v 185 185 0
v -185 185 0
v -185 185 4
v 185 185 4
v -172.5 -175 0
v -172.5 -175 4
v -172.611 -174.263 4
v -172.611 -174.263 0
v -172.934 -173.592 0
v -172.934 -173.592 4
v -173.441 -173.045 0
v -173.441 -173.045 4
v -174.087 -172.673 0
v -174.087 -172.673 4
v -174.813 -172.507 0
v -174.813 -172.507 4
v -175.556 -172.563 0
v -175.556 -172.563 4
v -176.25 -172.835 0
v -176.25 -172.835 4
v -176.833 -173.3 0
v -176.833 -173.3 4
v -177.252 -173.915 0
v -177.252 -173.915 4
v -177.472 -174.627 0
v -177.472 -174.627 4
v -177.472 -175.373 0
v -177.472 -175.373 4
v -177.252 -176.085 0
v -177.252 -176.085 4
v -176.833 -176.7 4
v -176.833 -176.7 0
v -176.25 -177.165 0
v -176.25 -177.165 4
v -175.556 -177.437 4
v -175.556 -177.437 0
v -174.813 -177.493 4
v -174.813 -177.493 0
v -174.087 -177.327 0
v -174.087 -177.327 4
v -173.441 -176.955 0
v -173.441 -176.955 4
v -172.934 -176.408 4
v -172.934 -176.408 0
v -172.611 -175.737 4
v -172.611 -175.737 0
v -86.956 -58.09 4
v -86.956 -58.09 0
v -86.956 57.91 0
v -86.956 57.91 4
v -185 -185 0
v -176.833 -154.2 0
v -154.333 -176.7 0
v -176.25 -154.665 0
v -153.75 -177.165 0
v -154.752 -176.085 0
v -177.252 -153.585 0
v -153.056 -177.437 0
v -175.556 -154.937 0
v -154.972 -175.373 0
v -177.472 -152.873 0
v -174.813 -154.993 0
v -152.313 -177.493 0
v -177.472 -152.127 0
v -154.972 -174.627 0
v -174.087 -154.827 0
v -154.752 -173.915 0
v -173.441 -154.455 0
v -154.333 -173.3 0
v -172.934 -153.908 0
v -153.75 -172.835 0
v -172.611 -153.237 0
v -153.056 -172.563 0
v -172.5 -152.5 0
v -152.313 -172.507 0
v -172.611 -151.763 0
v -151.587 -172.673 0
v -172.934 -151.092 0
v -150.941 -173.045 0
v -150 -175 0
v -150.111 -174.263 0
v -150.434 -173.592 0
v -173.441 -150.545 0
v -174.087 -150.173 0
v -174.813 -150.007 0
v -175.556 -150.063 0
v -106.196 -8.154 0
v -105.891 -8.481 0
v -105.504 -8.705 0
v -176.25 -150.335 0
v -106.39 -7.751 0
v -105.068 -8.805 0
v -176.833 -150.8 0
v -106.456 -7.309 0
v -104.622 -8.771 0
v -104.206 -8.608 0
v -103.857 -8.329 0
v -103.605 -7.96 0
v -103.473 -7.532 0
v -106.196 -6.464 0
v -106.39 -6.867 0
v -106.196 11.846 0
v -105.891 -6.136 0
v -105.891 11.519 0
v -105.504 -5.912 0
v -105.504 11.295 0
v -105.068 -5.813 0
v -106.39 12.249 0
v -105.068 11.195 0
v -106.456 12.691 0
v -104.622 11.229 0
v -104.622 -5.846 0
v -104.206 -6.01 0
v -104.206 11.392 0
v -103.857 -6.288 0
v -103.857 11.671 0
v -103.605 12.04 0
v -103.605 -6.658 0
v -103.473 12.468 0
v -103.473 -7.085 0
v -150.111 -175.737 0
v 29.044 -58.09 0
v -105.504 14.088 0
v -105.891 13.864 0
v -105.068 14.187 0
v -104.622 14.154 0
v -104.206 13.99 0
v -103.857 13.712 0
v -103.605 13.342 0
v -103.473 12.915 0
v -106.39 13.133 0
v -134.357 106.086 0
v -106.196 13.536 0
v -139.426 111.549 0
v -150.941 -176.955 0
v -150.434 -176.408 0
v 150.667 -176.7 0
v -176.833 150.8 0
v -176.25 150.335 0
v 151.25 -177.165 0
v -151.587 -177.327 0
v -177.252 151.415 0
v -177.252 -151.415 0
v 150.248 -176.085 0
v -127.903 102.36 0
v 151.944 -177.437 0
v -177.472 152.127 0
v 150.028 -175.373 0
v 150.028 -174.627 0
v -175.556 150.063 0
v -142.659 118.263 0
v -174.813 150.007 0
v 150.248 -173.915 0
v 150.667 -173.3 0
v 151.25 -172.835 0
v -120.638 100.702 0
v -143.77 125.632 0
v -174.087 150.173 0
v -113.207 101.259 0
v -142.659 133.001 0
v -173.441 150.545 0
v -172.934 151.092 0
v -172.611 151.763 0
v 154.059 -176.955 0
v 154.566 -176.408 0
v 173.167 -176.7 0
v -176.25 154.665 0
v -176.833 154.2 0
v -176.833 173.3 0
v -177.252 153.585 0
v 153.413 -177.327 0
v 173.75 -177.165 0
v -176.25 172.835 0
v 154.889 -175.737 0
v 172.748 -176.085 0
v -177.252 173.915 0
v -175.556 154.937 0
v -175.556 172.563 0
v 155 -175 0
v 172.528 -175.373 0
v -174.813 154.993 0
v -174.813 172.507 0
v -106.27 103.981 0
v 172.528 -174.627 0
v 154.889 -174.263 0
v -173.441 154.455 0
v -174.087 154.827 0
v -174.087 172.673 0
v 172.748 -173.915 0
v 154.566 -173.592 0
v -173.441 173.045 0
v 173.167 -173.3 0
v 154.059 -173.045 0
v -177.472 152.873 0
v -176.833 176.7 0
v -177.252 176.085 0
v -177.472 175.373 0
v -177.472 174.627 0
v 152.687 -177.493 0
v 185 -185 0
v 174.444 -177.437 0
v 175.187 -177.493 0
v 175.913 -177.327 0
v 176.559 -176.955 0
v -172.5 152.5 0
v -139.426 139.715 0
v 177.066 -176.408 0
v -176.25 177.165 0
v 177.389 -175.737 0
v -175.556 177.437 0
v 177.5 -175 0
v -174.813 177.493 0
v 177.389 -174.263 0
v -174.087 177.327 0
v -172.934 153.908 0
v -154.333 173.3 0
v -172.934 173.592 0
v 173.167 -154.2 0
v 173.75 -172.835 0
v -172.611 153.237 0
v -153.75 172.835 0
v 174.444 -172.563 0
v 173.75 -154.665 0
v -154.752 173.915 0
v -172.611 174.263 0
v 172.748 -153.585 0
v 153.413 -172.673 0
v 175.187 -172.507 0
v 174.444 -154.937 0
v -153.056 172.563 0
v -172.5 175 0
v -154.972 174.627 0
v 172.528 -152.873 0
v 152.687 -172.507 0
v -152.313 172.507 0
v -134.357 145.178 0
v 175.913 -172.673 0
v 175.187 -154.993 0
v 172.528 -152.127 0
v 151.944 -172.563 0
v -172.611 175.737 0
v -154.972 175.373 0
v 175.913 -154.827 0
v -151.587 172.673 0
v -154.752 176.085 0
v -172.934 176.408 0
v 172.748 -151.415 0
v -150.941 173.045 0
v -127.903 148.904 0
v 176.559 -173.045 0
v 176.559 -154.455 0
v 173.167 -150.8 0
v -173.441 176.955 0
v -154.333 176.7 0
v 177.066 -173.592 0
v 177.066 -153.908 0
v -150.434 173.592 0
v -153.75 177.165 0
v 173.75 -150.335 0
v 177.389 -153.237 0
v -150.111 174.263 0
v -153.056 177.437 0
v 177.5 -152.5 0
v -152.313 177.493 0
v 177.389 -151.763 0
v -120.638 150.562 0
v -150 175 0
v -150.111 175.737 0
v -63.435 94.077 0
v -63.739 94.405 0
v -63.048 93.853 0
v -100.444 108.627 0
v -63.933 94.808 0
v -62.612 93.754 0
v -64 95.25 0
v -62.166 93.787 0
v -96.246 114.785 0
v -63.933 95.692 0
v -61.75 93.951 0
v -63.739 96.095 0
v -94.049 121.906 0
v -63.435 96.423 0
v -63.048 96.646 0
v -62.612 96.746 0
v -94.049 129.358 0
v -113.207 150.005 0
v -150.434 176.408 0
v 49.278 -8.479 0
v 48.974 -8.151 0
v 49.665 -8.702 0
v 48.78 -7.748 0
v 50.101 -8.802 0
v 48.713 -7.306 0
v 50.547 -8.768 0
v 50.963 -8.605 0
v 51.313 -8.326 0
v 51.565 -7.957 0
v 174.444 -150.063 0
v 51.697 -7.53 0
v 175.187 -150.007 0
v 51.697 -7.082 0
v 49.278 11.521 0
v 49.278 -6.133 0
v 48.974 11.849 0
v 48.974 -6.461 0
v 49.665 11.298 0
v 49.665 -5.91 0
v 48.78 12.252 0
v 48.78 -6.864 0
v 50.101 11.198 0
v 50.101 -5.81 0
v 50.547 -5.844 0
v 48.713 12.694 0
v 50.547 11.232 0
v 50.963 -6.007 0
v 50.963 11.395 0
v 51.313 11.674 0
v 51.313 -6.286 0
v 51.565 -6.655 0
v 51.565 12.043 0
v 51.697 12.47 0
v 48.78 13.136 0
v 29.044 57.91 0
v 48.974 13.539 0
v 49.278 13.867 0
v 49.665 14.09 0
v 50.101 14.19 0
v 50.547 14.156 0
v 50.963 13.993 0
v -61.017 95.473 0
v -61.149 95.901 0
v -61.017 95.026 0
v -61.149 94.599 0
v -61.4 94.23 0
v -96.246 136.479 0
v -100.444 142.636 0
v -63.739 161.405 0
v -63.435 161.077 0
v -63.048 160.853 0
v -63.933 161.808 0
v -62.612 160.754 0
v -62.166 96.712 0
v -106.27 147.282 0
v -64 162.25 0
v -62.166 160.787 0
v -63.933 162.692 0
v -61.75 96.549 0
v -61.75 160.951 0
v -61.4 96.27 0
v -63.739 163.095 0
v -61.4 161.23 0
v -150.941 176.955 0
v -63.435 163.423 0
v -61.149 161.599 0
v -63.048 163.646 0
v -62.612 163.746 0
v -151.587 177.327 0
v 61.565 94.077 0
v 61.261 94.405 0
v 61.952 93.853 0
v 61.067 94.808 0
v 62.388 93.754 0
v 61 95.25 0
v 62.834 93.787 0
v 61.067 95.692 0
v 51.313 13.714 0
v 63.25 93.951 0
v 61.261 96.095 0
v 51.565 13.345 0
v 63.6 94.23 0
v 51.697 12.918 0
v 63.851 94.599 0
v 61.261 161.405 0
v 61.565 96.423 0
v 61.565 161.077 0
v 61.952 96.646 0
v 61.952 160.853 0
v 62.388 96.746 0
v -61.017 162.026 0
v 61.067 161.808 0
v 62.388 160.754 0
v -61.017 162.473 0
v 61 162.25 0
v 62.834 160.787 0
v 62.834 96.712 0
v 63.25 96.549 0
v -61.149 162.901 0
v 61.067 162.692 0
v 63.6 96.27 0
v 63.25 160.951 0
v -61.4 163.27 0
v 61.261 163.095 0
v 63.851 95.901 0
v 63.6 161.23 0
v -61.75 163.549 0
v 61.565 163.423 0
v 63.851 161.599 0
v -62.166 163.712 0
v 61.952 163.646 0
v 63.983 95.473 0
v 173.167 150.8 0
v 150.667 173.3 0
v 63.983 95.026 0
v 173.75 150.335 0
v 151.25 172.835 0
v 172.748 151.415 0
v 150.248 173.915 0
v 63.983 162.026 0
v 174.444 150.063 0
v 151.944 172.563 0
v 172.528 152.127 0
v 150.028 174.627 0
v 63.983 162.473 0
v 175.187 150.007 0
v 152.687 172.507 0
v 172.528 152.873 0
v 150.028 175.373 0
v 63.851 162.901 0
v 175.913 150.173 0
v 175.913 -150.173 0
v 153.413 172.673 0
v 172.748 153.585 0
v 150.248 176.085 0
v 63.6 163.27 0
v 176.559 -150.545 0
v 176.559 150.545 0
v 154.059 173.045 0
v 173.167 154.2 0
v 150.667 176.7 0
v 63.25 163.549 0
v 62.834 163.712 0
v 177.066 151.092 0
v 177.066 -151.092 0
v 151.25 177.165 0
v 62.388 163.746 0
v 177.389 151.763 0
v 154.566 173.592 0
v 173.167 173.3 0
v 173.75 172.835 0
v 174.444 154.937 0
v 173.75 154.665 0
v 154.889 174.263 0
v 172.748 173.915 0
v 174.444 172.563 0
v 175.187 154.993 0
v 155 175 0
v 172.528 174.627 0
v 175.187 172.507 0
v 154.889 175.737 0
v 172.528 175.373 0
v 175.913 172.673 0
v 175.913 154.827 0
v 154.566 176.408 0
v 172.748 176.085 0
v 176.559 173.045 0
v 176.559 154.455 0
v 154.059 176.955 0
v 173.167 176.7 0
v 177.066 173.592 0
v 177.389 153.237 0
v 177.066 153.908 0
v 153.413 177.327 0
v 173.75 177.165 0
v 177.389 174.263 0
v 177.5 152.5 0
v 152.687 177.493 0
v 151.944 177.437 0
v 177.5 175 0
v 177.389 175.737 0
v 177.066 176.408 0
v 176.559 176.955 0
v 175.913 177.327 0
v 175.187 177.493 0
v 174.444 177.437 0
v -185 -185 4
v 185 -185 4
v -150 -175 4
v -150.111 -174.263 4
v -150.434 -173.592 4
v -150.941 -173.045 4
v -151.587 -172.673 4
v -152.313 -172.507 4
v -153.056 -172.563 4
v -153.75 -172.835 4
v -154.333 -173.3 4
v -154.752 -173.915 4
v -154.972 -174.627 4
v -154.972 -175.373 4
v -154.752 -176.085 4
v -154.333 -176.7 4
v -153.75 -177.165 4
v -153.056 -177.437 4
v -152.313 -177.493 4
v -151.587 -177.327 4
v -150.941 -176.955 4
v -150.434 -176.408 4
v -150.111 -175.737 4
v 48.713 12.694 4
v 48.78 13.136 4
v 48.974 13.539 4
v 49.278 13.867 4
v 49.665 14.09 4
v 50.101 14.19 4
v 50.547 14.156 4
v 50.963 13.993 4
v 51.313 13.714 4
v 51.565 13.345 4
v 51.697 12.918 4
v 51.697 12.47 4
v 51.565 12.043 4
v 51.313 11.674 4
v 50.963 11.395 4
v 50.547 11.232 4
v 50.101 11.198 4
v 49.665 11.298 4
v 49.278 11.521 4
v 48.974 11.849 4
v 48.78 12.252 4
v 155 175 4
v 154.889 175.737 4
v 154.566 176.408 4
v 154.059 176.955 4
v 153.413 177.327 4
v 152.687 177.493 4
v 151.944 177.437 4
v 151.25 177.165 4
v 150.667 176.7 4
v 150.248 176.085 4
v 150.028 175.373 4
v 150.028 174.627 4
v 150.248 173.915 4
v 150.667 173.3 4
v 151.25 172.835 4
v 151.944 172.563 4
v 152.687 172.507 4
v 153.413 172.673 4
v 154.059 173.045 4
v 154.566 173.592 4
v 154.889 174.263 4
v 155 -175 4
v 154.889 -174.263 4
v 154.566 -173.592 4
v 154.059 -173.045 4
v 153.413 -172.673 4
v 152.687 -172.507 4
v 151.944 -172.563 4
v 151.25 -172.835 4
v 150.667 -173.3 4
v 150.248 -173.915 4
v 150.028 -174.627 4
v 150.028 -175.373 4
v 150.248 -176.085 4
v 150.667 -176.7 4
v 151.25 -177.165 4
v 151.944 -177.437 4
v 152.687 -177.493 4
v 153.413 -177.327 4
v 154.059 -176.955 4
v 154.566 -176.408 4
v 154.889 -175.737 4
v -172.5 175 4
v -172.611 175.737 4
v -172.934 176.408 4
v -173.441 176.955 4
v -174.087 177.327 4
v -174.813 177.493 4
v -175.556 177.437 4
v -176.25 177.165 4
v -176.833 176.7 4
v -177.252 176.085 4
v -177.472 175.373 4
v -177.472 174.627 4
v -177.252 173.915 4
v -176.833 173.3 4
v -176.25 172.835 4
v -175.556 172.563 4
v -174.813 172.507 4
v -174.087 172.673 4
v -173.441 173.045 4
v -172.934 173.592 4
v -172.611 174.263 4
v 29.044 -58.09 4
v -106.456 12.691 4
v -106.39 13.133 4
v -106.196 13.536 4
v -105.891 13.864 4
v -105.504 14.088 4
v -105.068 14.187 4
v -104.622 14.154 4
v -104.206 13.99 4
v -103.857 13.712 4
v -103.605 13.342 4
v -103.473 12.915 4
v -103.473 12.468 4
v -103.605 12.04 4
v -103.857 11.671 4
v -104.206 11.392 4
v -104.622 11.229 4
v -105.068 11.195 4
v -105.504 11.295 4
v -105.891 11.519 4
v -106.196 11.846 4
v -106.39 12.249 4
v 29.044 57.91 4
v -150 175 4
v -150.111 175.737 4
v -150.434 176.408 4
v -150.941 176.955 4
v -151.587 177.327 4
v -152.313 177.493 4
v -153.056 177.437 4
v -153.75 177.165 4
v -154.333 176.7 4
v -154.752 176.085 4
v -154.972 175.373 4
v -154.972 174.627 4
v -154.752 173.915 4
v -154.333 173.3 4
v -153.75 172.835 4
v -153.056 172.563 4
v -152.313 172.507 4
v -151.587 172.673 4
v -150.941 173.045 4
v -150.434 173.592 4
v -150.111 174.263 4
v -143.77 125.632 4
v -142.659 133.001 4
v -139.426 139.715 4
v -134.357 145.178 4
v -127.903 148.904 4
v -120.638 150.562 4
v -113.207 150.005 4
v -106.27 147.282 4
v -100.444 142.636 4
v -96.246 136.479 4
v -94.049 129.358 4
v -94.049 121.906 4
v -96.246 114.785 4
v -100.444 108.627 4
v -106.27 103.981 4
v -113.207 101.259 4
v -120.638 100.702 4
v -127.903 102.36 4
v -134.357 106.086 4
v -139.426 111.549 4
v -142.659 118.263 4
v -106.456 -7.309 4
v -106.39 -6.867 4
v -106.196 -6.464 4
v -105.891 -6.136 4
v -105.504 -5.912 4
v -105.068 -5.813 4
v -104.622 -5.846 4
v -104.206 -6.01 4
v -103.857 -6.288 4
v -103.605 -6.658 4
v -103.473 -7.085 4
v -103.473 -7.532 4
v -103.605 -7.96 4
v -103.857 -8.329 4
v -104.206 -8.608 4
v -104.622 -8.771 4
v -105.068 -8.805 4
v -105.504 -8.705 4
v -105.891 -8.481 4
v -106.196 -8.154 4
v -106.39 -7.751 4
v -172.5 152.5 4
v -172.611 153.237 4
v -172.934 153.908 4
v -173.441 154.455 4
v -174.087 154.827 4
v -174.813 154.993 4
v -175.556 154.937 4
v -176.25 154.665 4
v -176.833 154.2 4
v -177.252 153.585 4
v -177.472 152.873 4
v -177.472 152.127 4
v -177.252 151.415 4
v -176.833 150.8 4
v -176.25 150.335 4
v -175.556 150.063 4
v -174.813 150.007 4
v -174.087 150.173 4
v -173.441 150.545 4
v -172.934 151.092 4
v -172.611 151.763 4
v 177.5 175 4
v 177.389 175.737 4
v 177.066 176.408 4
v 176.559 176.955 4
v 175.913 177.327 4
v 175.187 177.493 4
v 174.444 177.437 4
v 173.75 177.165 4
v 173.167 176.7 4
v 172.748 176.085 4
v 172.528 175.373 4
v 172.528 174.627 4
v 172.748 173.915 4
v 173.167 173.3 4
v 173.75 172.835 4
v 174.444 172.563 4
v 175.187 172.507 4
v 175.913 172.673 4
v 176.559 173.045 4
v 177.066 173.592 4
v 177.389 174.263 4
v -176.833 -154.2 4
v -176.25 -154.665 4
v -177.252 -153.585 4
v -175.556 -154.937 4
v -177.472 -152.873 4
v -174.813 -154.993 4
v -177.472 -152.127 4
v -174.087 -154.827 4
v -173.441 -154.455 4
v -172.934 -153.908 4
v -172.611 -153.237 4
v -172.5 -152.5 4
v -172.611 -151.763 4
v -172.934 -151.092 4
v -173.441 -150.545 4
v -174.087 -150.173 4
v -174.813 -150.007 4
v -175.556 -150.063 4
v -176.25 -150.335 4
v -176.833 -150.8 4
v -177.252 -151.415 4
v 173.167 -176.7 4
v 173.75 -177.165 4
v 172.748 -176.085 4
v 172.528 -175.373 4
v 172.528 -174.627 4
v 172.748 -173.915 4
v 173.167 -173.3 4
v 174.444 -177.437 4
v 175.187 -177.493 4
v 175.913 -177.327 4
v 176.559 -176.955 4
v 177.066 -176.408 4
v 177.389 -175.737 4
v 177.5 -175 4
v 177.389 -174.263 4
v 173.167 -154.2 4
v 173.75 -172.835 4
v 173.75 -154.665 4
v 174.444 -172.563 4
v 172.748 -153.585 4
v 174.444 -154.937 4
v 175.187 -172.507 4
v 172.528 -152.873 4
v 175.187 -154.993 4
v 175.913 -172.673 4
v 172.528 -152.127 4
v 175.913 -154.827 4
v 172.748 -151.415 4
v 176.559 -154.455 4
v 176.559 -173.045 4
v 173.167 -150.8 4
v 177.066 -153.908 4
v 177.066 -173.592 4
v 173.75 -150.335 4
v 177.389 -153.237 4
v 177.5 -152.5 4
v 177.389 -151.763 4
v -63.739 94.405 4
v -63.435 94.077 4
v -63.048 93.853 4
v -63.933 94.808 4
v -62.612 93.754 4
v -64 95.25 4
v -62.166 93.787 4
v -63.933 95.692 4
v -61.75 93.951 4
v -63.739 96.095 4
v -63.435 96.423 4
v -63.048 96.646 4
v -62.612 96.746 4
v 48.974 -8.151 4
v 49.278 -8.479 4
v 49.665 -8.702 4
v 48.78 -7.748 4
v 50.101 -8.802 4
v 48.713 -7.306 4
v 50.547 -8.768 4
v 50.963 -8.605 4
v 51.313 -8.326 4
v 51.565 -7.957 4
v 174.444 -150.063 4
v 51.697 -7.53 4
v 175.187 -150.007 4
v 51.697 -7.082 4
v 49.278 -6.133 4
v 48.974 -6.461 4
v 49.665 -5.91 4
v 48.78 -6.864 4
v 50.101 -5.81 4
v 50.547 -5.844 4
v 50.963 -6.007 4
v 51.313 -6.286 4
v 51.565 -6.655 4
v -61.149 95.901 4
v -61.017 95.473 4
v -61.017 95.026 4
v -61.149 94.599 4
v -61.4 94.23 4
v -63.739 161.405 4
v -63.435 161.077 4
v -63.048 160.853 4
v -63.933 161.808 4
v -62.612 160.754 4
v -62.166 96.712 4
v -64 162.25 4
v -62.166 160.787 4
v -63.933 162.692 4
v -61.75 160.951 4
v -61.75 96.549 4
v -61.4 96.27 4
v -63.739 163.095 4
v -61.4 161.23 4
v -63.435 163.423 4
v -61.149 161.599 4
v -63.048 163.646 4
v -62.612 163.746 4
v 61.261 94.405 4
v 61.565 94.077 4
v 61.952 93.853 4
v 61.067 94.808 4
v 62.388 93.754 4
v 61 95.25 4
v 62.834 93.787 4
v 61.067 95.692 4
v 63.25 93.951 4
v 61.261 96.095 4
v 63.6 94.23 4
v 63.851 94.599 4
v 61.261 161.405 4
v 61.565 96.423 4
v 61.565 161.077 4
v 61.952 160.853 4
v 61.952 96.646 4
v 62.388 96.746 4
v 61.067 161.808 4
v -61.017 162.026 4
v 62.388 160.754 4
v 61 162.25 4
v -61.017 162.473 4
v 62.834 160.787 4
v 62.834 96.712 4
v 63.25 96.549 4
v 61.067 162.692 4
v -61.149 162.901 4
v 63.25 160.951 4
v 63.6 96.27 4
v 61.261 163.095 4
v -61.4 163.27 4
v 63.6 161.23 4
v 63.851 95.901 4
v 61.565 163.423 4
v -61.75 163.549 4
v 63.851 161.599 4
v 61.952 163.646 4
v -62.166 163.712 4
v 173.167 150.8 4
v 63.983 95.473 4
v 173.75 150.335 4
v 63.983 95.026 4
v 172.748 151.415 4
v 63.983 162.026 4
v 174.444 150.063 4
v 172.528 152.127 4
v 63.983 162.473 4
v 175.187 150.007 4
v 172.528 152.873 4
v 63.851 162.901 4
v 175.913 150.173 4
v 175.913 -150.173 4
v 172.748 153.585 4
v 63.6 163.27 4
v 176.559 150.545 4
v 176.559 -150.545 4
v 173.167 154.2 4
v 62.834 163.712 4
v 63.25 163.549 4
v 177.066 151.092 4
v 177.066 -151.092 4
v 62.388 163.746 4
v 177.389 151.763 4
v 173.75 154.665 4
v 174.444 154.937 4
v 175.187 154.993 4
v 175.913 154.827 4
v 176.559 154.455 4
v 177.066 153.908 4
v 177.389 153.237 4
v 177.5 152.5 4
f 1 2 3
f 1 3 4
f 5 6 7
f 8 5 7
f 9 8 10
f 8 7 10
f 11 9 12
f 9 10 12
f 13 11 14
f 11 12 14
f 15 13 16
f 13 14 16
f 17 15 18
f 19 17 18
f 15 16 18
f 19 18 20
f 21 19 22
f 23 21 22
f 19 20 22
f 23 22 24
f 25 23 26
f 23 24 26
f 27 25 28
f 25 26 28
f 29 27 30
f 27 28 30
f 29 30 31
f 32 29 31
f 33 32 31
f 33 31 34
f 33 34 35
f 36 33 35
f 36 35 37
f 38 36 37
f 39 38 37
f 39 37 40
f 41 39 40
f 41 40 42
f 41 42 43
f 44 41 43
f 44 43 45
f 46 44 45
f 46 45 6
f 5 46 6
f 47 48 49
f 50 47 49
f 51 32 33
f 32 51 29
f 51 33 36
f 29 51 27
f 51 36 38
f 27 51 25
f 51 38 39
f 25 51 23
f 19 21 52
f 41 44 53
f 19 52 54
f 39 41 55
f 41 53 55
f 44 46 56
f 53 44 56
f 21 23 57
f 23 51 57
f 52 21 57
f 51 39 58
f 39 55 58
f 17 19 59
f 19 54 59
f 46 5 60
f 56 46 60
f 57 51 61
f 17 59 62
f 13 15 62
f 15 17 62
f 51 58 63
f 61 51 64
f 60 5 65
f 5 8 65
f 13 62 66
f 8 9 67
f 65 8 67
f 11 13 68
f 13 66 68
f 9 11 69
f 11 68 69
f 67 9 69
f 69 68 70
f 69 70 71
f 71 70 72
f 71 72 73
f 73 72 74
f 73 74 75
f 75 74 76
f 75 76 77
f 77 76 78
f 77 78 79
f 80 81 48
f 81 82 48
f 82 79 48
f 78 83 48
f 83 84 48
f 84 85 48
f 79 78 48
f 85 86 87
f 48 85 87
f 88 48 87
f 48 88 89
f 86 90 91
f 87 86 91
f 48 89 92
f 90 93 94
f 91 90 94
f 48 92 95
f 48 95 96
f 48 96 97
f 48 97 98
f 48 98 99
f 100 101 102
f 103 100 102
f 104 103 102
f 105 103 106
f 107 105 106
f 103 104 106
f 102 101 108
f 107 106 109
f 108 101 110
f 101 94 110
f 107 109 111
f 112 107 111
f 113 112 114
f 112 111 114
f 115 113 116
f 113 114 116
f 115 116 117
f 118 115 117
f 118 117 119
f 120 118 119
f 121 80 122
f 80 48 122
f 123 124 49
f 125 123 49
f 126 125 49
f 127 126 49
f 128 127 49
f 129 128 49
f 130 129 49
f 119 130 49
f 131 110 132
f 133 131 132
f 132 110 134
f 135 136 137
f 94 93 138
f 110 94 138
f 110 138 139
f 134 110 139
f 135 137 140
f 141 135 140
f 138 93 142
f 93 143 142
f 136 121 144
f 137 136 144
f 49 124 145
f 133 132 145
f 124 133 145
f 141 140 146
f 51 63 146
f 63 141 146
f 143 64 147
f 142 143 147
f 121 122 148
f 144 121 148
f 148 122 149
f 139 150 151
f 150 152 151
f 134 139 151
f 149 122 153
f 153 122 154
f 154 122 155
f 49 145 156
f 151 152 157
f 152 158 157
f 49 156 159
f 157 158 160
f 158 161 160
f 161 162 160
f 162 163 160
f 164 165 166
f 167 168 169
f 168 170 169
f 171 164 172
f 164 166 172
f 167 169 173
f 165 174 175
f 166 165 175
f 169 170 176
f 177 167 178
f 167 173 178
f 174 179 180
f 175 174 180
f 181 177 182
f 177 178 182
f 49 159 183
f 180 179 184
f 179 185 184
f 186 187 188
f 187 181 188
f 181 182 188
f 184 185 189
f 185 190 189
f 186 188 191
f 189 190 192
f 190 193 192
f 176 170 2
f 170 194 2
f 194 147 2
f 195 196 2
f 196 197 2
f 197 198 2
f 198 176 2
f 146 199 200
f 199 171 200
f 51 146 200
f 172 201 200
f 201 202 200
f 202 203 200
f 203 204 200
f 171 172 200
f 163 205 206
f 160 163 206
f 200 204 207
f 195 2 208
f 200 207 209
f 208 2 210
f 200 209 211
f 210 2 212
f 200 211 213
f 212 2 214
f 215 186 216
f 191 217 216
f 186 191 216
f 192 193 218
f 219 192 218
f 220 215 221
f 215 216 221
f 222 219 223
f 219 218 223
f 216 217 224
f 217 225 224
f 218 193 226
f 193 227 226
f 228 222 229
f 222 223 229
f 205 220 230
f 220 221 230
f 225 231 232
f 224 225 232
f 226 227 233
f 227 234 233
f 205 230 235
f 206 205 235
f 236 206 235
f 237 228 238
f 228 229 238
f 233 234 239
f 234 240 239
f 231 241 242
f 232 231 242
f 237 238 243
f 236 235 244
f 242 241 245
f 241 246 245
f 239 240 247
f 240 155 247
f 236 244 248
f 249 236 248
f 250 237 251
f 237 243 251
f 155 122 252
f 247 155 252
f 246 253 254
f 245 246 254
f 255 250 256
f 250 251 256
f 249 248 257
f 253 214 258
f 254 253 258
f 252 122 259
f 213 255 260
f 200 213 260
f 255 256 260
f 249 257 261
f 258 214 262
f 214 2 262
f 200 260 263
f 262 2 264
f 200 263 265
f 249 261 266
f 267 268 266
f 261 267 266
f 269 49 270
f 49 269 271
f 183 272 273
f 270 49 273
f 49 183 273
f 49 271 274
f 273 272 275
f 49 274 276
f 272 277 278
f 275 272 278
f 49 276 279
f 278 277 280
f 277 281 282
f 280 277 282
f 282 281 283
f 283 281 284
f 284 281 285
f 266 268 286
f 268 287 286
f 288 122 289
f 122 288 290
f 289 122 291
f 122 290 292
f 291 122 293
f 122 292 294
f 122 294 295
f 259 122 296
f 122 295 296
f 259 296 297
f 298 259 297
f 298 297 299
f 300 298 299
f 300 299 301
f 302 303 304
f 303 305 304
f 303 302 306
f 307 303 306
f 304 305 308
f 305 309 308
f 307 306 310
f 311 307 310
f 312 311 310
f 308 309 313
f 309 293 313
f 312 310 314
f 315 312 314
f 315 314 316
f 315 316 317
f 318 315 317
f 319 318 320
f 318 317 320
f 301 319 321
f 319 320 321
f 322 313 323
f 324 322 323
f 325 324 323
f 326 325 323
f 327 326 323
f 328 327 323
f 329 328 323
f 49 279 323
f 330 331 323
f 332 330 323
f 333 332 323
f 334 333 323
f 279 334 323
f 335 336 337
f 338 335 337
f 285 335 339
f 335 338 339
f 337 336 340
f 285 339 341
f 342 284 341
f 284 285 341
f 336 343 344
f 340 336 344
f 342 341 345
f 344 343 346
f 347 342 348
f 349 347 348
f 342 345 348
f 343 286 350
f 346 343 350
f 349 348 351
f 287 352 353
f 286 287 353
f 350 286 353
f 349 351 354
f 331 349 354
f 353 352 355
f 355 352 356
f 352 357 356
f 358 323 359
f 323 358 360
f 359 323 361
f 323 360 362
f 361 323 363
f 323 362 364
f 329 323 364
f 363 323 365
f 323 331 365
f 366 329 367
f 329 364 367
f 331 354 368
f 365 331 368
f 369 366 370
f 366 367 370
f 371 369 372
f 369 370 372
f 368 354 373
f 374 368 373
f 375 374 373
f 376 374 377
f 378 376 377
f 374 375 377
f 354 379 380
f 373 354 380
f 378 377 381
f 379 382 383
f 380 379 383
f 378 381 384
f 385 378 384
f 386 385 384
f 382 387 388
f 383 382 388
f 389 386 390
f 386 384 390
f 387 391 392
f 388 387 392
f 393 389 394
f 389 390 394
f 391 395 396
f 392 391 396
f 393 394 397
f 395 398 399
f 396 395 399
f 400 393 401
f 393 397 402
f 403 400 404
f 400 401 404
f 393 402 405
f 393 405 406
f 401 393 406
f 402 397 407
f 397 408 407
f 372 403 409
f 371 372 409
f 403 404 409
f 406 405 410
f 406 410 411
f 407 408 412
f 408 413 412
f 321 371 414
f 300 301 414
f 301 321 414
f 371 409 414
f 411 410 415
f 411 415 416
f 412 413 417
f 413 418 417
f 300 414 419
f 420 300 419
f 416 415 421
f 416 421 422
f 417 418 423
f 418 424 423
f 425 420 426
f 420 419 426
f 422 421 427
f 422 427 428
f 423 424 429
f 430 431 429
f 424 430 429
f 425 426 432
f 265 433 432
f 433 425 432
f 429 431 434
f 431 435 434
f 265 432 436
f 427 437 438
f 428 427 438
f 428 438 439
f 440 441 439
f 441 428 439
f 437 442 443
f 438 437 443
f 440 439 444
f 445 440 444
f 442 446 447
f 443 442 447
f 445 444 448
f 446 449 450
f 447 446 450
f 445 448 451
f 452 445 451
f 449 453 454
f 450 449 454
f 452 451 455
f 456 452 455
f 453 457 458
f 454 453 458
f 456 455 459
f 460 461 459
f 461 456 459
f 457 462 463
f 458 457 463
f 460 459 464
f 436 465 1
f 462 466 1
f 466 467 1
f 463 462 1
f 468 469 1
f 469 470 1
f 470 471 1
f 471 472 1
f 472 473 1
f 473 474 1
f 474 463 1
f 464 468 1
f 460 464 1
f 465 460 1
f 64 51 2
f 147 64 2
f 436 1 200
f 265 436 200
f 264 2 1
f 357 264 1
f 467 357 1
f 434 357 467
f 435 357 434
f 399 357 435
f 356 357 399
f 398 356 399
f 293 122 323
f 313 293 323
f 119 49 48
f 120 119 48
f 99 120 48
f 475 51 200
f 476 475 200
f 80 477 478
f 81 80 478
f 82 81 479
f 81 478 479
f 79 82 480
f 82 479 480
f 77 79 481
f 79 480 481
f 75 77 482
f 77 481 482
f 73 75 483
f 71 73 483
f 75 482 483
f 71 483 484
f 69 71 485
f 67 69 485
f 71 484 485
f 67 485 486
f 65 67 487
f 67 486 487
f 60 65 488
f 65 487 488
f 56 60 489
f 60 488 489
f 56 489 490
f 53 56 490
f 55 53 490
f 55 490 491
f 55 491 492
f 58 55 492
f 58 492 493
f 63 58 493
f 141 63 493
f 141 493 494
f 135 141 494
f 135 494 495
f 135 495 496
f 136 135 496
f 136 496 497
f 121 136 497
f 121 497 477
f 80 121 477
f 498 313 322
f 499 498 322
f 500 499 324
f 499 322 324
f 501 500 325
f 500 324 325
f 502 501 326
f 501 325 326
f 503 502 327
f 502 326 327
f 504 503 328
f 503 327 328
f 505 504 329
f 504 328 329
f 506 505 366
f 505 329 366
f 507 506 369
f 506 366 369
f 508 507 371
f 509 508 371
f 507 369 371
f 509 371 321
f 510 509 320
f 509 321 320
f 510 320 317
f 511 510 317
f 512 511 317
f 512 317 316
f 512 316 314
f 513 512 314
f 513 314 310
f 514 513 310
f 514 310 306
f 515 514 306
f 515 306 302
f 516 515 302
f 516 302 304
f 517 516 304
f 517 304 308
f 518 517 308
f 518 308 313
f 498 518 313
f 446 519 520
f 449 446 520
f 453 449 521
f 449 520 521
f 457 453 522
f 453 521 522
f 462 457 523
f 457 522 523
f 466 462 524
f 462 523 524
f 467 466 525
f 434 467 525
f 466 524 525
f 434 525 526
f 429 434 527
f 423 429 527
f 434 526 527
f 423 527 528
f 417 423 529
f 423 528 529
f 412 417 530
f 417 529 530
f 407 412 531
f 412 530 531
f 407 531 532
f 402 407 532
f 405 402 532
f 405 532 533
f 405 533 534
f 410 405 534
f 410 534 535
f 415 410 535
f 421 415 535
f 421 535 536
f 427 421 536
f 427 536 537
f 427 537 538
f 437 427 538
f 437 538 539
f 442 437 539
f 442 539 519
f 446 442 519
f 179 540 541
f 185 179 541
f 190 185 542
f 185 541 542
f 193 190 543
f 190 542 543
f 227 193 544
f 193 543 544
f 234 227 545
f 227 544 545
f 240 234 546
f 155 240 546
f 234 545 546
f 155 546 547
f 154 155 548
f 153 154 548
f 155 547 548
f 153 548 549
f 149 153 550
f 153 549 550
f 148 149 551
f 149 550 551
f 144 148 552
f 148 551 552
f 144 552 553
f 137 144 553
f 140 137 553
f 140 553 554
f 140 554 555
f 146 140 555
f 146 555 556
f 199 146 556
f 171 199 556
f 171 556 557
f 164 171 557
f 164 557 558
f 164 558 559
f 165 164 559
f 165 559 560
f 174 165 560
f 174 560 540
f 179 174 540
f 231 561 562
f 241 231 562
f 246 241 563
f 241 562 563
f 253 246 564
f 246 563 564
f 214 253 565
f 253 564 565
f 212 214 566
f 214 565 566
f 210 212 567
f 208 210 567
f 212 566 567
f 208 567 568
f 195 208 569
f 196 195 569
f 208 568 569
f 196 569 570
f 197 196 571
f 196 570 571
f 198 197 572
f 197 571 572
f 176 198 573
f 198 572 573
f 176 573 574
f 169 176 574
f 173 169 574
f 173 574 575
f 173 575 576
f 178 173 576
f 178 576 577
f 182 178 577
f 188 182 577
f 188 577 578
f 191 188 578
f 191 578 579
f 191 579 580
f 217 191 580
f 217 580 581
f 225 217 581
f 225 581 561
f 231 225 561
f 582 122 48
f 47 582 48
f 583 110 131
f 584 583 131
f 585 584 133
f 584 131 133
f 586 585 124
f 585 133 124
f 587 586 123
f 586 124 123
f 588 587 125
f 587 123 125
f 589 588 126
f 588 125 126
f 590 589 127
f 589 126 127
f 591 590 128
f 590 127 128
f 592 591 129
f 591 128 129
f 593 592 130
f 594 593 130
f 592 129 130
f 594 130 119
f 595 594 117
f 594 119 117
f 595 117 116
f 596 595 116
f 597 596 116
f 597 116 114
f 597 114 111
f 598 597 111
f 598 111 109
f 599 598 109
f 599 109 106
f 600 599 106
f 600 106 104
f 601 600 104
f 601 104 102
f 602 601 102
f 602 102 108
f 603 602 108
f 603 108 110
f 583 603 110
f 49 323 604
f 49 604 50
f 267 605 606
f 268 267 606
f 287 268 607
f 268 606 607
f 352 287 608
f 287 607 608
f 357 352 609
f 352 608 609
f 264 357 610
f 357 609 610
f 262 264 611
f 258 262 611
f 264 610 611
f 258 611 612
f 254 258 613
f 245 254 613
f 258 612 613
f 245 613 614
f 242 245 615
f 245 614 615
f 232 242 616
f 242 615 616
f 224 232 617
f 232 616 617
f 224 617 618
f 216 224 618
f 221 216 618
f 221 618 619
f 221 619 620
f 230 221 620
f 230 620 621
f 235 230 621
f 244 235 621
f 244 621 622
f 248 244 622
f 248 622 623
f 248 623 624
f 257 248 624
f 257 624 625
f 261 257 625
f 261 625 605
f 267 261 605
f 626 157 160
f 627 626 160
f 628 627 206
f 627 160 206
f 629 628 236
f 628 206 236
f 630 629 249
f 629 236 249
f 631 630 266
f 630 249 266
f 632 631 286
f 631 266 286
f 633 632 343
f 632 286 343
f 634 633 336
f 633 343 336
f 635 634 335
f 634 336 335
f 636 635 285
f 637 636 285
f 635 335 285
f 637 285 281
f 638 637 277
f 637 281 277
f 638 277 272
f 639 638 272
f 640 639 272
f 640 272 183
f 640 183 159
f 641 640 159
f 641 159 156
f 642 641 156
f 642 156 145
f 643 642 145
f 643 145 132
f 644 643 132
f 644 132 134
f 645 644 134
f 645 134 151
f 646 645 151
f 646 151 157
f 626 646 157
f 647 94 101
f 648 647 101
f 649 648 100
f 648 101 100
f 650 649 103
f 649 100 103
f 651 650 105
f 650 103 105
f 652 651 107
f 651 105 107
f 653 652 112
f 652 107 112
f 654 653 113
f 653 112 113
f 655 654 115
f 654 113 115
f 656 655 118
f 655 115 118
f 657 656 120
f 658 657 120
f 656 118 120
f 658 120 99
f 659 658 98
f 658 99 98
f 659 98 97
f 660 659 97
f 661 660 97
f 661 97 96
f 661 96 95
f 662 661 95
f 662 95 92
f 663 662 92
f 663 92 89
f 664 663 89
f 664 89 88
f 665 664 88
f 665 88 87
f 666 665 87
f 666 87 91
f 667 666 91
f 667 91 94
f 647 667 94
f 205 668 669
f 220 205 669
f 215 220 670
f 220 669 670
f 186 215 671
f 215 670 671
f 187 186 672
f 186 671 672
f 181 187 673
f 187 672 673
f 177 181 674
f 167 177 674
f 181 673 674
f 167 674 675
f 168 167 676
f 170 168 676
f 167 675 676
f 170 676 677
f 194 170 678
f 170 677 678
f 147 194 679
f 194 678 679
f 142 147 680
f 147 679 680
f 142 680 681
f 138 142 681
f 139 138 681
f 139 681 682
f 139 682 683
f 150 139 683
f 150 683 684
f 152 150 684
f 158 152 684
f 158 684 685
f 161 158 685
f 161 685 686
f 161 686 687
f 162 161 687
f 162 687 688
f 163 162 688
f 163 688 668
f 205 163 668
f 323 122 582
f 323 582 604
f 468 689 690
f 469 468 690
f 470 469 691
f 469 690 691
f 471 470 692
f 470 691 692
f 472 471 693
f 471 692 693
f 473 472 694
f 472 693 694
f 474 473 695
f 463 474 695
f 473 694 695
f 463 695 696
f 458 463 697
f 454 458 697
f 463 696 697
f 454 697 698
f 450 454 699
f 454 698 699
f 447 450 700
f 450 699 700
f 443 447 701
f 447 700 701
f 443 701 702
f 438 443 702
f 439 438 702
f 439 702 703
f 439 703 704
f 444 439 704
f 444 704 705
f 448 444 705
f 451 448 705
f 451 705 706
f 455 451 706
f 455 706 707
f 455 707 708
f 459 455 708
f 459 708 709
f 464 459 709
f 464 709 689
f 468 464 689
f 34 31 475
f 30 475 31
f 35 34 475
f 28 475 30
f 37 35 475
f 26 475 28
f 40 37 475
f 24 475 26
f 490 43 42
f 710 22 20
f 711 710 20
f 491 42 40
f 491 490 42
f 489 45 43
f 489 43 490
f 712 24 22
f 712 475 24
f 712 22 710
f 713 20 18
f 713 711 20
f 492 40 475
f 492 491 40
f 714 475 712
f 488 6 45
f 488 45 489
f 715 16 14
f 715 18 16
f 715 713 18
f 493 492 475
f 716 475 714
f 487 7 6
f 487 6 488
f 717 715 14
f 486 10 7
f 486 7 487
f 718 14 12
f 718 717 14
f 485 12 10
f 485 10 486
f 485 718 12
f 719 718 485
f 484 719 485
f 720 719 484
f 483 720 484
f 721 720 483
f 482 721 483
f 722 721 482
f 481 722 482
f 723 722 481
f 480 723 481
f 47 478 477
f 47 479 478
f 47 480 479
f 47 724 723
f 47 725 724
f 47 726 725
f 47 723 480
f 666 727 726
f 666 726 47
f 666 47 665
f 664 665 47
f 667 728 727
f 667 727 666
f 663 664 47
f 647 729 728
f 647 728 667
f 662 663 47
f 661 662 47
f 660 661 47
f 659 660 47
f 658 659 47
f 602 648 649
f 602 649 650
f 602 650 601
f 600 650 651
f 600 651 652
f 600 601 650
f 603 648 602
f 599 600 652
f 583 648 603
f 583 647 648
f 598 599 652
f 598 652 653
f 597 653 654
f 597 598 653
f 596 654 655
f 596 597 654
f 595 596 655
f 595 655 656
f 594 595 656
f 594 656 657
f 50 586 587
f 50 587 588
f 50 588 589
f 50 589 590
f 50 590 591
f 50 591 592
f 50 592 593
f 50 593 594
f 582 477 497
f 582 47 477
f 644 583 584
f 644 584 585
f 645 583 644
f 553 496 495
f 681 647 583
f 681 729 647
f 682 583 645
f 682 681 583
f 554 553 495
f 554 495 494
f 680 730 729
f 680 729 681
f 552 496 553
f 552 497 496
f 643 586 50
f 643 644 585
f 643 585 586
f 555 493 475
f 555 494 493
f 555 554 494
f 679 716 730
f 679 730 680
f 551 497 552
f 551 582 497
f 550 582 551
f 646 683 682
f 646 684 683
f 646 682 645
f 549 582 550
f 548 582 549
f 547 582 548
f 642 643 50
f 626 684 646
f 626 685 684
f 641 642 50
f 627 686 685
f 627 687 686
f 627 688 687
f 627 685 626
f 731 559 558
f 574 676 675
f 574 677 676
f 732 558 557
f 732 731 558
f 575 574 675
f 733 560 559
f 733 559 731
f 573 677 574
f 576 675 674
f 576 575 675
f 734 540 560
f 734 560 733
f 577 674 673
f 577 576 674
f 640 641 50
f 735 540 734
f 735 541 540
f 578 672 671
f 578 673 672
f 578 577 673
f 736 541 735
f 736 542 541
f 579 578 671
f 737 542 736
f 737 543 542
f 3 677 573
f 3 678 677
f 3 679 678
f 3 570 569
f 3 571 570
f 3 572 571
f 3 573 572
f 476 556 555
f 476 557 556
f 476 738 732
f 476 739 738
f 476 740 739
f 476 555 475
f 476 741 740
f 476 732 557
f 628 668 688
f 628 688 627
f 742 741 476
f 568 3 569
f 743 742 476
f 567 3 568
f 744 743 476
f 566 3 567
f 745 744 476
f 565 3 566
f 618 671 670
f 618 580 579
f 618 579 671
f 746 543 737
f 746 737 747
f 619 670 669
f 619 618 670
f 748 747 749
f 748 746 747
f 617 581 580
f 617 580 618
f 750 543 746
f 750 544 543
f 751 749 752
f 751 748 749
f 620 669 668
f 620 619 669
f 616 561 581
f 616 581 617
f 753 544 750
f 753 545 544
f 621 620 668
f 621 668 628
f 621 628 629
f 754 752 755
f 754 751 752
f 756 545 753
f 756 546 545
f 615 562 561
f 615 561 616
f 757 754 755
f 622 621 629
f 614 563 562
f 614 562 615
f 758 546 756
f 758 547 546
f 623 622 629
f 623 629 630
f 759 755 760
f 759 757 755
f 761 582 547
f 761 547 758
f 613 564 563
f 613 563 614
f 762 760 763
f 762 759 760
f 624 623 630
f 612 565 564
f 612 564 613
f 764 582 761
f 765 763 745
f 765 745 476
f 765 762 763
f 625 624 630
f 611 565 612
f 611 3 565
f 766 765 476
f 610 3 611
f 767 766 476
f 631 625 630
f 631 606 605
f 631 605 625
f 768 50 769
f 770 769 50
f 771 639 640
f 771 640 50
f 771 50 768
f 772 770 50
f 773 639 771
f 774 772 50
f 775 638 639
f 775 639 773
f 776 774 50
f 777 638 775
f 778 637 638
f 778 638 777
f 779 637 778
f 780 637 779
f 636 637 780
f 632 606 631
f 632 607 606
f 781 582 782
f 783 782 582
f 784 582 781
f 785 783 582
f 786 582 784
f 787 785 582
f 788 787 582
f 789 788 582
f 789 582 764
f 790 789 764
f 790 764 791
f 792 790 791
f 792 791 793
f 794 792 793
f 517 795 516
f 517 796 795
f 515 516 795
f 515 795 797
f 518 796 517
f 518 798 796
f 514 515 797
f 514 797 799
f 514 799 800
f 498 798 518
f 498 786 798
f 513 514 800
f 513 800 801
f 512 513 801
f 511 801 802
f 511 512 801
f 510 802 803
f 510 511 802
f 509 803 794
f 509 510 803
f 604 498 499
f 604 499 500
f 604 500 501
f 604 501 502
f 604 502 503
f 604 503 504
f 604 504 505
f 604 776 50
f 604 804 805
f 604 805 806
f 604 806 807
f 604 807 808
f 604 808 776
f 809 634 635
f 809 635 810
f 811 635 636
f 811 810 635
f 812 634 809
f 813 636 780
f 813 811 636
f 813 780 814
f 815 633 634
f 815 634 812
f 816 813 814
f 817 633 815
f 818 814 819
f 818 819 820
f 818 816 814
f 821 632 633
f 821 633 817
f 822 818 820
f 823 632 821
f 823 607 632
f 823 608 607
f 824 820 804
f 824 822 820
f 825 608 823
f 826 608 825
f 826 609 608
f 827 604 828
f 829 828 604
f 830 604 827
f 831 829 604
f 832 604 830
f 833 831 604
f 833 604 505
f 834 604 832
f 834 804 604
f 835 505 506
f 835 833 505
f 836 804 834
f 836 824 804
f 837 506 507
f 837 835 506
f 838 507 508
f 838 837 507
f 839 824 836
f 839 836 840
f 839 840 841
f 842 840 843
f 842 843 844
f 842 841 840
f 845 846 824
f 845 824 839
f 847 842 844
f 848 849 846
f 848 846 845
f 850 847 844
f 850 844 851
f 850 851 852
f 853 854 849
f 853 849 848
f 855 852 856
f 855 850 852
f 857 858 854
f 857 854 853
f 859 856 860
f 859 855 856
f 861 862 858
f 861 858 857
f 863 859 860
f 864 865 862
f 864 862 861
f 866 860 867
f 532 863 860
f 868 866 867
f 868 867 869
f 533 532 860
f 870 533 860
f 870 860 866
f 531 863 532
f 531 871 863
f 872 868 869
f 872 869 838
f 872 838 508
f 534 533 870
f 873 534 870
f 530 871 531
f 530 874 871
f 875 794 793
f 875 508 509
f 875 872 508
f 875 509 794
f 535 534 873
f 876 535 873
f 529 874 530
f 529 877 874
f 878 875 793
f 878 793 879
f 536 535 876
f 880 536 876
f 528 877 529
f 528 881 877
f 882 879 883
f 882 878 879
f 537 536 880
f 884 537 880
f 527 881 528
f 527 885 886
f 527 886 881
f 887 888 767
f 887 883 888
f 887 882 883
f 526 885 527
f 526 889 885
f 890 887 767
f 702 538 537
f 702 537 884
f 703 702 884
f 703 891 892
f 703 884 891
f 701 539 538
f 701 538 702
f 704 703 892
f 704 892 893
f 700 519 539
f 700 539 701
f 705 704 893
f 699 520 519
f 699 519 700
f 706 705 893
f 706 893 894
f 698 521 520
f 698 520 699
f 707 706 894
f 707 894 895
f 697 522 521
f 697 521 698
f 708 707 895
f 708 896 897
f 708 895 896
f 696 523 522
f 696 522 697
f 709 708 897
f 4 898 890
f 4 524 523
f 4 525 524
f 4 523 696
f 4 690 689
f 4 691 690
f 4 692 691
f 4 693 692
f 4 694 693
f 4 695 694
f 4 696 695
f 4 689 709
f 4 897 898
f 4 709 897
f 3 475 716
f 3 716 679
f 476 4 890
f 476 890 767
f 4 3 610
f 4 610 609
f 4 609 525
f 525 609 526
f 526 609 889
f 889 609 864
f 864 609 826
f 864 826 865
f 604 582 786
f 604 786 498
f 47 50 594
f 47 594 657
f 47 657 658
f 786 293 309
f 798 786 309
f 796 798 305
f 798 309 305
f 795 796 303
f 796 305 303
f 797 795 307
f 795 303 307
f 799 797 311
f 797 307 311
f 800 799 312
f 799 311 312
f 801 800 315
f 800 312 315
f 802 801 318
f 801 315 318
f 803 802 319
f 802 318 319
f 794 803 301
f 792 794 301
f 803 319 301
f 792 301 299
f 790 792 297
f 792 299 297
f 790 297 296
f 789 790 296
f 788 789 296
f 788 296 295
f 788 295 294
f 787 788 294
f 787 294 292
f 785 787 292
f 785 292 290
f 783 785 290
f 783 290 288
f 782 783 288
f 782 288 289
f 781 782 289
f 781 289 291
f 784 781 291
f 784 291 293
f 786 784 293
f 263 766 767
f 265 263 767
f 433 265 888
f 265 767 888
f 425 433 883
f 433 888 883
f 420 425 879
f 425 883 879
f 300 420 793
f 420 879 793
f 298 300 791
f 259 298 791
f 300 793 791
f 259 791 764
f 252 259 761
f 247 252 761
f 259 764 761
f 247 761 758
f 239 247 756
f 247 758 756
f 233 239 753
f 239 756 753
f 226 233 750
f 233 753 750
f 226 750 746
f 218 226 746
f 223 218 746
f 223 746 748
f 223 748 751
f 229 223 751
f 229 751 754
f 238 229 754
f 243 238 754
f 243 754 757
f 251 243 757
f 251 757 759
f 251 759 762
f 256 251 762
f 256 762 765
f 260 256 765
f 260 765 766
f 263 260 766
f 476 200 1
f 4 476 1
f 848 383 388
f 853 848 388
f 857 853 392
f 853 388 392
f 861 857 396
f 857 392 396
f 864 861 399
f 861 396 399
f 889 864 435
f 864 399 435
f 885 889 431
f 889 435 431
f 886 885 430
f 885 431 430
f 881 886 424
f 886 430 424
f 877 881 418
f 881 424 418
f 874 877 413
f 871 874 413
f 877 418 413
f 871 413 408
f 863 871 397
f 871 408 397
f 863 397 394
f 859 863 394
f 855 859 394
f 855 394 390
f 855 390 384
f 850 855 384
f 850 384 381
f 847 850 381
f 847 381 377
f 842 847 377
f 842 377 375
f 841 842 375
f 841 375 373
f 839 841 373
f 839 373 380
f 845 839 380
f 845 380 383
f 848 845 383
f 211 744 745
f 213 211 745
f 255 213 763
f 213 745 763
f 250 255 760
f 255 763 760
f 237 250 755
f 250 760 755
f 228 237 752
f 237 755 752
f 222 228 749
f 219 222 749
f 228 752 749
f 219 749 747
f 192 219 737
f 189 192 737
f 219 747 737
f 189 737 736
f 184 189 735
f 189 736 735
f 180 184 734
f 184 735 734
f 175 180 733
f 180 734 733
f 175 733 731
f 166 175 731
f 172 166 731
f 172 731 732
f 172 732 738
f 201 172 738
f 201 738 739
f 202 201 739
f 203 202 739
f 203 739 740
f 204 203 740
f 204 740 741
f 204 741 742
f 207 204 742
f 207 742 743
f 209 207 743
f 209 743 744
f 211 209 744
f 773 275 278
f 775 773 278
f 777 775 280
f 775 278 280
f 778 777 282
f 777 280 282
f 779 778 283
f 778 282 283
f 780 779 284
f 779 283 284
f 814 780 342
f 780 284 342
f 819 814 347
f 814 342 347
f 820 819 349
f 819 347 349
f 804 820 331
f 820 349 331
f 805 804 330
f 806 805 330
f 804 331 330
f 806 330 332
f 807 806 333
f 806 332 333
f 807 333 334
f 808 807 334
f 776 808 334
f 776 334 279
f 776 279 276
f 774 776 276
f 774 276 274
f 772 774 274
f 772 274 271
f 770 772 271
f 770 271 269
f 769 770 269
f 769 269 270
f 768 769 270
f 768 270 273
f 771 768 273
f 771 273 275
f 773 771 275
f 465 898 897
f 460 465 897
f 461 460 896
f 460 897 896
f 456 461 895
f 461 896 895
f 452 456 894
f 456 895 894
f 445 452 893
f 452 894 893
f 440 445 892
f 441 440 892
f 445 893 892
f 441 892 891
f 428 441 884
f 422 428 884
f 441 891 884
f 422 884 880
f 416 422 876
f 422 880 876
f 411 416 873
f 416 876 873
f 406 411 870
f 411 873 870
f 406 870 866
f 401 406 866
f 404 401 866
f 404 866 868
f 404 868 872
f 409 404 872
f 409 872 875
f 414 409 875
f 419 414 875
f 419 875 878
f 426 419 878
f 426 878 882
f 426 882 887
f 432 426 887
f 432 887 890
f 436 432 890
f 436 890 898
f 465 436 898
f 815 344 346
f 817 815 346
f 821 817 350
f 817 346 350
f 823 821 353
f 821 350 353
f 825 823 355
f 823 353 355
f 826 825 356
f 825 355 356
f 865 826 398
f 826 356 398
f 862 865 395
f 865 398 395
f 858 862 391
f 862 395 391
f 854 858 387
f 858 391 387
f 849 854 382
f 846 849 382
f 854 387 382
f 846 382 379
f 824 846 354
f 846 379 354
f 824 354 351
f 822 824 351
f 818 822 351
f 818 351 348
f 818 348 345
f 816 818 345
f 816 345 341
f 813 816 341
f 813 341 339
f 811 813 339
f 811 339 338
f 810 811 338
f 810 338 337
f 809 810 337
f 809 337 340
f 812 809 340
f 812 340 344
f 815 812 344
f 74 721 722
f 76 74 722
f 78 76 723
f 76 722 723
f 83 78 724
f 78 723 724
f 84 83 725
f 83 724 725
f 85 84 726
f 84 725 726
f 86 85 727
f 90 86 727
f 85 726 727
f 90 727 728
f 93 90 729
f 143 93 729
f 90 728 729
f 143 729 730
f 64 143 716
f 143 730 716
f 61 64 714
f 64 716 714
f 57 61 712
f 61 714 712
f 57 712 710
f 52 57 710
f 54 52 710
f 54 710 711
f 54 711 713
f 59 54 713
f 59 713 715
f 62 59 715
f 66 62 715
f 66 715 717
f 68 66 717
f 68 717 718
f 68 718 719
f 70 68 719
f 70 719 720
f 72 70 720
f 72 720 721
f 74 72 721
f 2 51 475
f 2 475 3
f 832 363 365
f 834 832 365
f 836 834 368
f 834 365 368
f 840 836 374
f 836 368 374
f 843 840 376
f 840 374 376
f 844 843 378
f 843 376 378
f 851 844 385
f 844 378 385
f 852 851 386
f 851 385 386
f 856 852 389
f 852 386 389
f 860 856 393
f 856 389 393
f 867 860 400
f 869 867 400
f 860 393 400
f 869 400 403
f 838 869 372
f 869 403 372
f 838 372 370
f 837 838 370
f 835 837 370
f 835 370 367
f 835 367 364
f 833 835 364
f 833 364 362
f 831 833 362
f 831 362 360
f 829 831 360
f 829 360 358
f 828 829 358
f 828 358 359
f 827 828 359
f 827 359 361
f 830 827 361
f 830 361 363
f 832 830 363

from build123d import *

# Parameters (mm, degrees)
SKETCH_1_W          = 370
SKETCH_1_H          = 370
EXTRUDE_1_DEPTH     = 4
SKETCH_2_R          = 2.5
CUT_EXTRUDE_1_DEPTH = 262.660084843
SKETCH_4_W          = 116
SKETCH_4_H          = 116
CUT_EXTRUDE_5_DEPTH = 262.660084843
SKETCH_6_R          = 1.5
CUT_EXTRUDE_7_DEPTH = 262.660084843
SKETCH_7_R          = 25
CUT_EXTRUDE_8_DEPTH = 262.660084843
SKETCH_8_R          = 1.5
CUT_EXTRUDE_9_DEPTH = 10


with BuildPart() as part:
    # 草图1 → 凸台-拉伸1 (new body)
    with BuildSketch(Plane.XY):
        Rectangle(SKETCH_1_W, SKETCH_1_H)
    extrude(amount=EXTRUDE_1_DEPTH)

    # 草图2 → 切除-拉伸1 (cut, through all)
    with BuildSketch(Plane.XY.offset(4)):
        with Locations((-175, -175)):
            Circle(SKETCH_2_R)
        with Locations((-152.5, -175)):
            Circle(SKETCH_2_R)
        with Locations((-175, -152.5)):
            Circle(SKETCH_2_R)
        with Locations((-152.5, 175)):
            Circle(SKETCH_2_R)
        with Locations((-175, 152.5)):
            Circle(SKETCH_2_R)
        with Locations((-175, 175)):
            Circle(SKETCH_2_R)
        with Locations((175, 152.5)):
            Circle(SKETCH_2_R)
        with Locations((152.5, 175)):
            Circle(SKETCH_2_R)
        with Locations((175, 175)):
            Circle(SKETCH_2_R)
        with Locations((152.5, -175)):
            Circle(SKETCH_2_R)
        with Locations((175, -152.5)):
            Circle(SKETCH_2_R)
        with Locations((175, -175)):
            Circle(SKETCH_2_R)
    extrude(amount=-CUT_EXTRUDE_1_DEPTH, mode=Mode.SUBTRACT)

    # 草图4 → 切除-拉伸5 (cut, through all)
    with BuildSketch(Plane(origin=(0, 0, 0), x_dir=(-1, 0, 0), z_dir=(0, 0, -1))):
        with Locations((28.956152895, -0.09)):
            Rectangle(SKETCH_4_W, SKETCH_4_H)
    extrude(amount=-CUT_EXTRUDE_5_DEPTH, mode=Mode.SUBTRACT)

    # 草图6 → 切除-拉伸7 (cut, through all)
    with BuildSketch(Plane(origin=(0, 0, 0), x_dir=(-1, 0, 0), z_dir=(0, 0, -1))):
        with Locations((-62.5, 162.249795252)):
            Circle(SKETCH_6_R)
        with Locations((-62.5, 95.249795252)):
            Circle(SKETCH_6_R)
        with Locations((62.5, 95.249795252)):
            Circle(SKETCH_6_R)
        with Locations((62.5, 162.249795252)):
            Circle(SKETCH_6_R)
    extrude(amount=-CUT_EXTRUDE_7_DEPTH, mode=Mode.SUBTRACT)

    # 草图7 → 切除-拉伸8 (cut, through all)
    with BuildSketch(Plane(origin=(0, 0, 0), x_dir=(-1, 0, 0), z_dir=(0, 0, -1))):
        with Locations((118.769854949, 125.631801741)):
            Circle(SKETCH_7_R)
    extrude(amount=-CUT_EXTRUDE_8_DEPTH, mode=Mode.SUBTRACT)

    # 草图8 → 切除-拉伸9 (cut)
    with BuildSketch(Plane(origin=(0, 0, 0), x_dir=(-1, 0, 0), z_dir=(0, 0, -1))):
        with Locations((-50.21335715, -7.305969028)):
            Circle(SKETCH_8_R)
        with Locations((-50.21335715, 12.694030972)):
            Circle(SKETCH_8_R)
        with Locations((104.956152895, -7.308718804)):
            Circle(SKETCH_8_R)
        with Locations((104.956152895, 12.691281196)):
            Circle(SKETCH_8_R)
    extrude(amount=-CUT_EXTRUDE_9_DEPTH, mode=Mode.SUBTRACT)


solid = part.part
